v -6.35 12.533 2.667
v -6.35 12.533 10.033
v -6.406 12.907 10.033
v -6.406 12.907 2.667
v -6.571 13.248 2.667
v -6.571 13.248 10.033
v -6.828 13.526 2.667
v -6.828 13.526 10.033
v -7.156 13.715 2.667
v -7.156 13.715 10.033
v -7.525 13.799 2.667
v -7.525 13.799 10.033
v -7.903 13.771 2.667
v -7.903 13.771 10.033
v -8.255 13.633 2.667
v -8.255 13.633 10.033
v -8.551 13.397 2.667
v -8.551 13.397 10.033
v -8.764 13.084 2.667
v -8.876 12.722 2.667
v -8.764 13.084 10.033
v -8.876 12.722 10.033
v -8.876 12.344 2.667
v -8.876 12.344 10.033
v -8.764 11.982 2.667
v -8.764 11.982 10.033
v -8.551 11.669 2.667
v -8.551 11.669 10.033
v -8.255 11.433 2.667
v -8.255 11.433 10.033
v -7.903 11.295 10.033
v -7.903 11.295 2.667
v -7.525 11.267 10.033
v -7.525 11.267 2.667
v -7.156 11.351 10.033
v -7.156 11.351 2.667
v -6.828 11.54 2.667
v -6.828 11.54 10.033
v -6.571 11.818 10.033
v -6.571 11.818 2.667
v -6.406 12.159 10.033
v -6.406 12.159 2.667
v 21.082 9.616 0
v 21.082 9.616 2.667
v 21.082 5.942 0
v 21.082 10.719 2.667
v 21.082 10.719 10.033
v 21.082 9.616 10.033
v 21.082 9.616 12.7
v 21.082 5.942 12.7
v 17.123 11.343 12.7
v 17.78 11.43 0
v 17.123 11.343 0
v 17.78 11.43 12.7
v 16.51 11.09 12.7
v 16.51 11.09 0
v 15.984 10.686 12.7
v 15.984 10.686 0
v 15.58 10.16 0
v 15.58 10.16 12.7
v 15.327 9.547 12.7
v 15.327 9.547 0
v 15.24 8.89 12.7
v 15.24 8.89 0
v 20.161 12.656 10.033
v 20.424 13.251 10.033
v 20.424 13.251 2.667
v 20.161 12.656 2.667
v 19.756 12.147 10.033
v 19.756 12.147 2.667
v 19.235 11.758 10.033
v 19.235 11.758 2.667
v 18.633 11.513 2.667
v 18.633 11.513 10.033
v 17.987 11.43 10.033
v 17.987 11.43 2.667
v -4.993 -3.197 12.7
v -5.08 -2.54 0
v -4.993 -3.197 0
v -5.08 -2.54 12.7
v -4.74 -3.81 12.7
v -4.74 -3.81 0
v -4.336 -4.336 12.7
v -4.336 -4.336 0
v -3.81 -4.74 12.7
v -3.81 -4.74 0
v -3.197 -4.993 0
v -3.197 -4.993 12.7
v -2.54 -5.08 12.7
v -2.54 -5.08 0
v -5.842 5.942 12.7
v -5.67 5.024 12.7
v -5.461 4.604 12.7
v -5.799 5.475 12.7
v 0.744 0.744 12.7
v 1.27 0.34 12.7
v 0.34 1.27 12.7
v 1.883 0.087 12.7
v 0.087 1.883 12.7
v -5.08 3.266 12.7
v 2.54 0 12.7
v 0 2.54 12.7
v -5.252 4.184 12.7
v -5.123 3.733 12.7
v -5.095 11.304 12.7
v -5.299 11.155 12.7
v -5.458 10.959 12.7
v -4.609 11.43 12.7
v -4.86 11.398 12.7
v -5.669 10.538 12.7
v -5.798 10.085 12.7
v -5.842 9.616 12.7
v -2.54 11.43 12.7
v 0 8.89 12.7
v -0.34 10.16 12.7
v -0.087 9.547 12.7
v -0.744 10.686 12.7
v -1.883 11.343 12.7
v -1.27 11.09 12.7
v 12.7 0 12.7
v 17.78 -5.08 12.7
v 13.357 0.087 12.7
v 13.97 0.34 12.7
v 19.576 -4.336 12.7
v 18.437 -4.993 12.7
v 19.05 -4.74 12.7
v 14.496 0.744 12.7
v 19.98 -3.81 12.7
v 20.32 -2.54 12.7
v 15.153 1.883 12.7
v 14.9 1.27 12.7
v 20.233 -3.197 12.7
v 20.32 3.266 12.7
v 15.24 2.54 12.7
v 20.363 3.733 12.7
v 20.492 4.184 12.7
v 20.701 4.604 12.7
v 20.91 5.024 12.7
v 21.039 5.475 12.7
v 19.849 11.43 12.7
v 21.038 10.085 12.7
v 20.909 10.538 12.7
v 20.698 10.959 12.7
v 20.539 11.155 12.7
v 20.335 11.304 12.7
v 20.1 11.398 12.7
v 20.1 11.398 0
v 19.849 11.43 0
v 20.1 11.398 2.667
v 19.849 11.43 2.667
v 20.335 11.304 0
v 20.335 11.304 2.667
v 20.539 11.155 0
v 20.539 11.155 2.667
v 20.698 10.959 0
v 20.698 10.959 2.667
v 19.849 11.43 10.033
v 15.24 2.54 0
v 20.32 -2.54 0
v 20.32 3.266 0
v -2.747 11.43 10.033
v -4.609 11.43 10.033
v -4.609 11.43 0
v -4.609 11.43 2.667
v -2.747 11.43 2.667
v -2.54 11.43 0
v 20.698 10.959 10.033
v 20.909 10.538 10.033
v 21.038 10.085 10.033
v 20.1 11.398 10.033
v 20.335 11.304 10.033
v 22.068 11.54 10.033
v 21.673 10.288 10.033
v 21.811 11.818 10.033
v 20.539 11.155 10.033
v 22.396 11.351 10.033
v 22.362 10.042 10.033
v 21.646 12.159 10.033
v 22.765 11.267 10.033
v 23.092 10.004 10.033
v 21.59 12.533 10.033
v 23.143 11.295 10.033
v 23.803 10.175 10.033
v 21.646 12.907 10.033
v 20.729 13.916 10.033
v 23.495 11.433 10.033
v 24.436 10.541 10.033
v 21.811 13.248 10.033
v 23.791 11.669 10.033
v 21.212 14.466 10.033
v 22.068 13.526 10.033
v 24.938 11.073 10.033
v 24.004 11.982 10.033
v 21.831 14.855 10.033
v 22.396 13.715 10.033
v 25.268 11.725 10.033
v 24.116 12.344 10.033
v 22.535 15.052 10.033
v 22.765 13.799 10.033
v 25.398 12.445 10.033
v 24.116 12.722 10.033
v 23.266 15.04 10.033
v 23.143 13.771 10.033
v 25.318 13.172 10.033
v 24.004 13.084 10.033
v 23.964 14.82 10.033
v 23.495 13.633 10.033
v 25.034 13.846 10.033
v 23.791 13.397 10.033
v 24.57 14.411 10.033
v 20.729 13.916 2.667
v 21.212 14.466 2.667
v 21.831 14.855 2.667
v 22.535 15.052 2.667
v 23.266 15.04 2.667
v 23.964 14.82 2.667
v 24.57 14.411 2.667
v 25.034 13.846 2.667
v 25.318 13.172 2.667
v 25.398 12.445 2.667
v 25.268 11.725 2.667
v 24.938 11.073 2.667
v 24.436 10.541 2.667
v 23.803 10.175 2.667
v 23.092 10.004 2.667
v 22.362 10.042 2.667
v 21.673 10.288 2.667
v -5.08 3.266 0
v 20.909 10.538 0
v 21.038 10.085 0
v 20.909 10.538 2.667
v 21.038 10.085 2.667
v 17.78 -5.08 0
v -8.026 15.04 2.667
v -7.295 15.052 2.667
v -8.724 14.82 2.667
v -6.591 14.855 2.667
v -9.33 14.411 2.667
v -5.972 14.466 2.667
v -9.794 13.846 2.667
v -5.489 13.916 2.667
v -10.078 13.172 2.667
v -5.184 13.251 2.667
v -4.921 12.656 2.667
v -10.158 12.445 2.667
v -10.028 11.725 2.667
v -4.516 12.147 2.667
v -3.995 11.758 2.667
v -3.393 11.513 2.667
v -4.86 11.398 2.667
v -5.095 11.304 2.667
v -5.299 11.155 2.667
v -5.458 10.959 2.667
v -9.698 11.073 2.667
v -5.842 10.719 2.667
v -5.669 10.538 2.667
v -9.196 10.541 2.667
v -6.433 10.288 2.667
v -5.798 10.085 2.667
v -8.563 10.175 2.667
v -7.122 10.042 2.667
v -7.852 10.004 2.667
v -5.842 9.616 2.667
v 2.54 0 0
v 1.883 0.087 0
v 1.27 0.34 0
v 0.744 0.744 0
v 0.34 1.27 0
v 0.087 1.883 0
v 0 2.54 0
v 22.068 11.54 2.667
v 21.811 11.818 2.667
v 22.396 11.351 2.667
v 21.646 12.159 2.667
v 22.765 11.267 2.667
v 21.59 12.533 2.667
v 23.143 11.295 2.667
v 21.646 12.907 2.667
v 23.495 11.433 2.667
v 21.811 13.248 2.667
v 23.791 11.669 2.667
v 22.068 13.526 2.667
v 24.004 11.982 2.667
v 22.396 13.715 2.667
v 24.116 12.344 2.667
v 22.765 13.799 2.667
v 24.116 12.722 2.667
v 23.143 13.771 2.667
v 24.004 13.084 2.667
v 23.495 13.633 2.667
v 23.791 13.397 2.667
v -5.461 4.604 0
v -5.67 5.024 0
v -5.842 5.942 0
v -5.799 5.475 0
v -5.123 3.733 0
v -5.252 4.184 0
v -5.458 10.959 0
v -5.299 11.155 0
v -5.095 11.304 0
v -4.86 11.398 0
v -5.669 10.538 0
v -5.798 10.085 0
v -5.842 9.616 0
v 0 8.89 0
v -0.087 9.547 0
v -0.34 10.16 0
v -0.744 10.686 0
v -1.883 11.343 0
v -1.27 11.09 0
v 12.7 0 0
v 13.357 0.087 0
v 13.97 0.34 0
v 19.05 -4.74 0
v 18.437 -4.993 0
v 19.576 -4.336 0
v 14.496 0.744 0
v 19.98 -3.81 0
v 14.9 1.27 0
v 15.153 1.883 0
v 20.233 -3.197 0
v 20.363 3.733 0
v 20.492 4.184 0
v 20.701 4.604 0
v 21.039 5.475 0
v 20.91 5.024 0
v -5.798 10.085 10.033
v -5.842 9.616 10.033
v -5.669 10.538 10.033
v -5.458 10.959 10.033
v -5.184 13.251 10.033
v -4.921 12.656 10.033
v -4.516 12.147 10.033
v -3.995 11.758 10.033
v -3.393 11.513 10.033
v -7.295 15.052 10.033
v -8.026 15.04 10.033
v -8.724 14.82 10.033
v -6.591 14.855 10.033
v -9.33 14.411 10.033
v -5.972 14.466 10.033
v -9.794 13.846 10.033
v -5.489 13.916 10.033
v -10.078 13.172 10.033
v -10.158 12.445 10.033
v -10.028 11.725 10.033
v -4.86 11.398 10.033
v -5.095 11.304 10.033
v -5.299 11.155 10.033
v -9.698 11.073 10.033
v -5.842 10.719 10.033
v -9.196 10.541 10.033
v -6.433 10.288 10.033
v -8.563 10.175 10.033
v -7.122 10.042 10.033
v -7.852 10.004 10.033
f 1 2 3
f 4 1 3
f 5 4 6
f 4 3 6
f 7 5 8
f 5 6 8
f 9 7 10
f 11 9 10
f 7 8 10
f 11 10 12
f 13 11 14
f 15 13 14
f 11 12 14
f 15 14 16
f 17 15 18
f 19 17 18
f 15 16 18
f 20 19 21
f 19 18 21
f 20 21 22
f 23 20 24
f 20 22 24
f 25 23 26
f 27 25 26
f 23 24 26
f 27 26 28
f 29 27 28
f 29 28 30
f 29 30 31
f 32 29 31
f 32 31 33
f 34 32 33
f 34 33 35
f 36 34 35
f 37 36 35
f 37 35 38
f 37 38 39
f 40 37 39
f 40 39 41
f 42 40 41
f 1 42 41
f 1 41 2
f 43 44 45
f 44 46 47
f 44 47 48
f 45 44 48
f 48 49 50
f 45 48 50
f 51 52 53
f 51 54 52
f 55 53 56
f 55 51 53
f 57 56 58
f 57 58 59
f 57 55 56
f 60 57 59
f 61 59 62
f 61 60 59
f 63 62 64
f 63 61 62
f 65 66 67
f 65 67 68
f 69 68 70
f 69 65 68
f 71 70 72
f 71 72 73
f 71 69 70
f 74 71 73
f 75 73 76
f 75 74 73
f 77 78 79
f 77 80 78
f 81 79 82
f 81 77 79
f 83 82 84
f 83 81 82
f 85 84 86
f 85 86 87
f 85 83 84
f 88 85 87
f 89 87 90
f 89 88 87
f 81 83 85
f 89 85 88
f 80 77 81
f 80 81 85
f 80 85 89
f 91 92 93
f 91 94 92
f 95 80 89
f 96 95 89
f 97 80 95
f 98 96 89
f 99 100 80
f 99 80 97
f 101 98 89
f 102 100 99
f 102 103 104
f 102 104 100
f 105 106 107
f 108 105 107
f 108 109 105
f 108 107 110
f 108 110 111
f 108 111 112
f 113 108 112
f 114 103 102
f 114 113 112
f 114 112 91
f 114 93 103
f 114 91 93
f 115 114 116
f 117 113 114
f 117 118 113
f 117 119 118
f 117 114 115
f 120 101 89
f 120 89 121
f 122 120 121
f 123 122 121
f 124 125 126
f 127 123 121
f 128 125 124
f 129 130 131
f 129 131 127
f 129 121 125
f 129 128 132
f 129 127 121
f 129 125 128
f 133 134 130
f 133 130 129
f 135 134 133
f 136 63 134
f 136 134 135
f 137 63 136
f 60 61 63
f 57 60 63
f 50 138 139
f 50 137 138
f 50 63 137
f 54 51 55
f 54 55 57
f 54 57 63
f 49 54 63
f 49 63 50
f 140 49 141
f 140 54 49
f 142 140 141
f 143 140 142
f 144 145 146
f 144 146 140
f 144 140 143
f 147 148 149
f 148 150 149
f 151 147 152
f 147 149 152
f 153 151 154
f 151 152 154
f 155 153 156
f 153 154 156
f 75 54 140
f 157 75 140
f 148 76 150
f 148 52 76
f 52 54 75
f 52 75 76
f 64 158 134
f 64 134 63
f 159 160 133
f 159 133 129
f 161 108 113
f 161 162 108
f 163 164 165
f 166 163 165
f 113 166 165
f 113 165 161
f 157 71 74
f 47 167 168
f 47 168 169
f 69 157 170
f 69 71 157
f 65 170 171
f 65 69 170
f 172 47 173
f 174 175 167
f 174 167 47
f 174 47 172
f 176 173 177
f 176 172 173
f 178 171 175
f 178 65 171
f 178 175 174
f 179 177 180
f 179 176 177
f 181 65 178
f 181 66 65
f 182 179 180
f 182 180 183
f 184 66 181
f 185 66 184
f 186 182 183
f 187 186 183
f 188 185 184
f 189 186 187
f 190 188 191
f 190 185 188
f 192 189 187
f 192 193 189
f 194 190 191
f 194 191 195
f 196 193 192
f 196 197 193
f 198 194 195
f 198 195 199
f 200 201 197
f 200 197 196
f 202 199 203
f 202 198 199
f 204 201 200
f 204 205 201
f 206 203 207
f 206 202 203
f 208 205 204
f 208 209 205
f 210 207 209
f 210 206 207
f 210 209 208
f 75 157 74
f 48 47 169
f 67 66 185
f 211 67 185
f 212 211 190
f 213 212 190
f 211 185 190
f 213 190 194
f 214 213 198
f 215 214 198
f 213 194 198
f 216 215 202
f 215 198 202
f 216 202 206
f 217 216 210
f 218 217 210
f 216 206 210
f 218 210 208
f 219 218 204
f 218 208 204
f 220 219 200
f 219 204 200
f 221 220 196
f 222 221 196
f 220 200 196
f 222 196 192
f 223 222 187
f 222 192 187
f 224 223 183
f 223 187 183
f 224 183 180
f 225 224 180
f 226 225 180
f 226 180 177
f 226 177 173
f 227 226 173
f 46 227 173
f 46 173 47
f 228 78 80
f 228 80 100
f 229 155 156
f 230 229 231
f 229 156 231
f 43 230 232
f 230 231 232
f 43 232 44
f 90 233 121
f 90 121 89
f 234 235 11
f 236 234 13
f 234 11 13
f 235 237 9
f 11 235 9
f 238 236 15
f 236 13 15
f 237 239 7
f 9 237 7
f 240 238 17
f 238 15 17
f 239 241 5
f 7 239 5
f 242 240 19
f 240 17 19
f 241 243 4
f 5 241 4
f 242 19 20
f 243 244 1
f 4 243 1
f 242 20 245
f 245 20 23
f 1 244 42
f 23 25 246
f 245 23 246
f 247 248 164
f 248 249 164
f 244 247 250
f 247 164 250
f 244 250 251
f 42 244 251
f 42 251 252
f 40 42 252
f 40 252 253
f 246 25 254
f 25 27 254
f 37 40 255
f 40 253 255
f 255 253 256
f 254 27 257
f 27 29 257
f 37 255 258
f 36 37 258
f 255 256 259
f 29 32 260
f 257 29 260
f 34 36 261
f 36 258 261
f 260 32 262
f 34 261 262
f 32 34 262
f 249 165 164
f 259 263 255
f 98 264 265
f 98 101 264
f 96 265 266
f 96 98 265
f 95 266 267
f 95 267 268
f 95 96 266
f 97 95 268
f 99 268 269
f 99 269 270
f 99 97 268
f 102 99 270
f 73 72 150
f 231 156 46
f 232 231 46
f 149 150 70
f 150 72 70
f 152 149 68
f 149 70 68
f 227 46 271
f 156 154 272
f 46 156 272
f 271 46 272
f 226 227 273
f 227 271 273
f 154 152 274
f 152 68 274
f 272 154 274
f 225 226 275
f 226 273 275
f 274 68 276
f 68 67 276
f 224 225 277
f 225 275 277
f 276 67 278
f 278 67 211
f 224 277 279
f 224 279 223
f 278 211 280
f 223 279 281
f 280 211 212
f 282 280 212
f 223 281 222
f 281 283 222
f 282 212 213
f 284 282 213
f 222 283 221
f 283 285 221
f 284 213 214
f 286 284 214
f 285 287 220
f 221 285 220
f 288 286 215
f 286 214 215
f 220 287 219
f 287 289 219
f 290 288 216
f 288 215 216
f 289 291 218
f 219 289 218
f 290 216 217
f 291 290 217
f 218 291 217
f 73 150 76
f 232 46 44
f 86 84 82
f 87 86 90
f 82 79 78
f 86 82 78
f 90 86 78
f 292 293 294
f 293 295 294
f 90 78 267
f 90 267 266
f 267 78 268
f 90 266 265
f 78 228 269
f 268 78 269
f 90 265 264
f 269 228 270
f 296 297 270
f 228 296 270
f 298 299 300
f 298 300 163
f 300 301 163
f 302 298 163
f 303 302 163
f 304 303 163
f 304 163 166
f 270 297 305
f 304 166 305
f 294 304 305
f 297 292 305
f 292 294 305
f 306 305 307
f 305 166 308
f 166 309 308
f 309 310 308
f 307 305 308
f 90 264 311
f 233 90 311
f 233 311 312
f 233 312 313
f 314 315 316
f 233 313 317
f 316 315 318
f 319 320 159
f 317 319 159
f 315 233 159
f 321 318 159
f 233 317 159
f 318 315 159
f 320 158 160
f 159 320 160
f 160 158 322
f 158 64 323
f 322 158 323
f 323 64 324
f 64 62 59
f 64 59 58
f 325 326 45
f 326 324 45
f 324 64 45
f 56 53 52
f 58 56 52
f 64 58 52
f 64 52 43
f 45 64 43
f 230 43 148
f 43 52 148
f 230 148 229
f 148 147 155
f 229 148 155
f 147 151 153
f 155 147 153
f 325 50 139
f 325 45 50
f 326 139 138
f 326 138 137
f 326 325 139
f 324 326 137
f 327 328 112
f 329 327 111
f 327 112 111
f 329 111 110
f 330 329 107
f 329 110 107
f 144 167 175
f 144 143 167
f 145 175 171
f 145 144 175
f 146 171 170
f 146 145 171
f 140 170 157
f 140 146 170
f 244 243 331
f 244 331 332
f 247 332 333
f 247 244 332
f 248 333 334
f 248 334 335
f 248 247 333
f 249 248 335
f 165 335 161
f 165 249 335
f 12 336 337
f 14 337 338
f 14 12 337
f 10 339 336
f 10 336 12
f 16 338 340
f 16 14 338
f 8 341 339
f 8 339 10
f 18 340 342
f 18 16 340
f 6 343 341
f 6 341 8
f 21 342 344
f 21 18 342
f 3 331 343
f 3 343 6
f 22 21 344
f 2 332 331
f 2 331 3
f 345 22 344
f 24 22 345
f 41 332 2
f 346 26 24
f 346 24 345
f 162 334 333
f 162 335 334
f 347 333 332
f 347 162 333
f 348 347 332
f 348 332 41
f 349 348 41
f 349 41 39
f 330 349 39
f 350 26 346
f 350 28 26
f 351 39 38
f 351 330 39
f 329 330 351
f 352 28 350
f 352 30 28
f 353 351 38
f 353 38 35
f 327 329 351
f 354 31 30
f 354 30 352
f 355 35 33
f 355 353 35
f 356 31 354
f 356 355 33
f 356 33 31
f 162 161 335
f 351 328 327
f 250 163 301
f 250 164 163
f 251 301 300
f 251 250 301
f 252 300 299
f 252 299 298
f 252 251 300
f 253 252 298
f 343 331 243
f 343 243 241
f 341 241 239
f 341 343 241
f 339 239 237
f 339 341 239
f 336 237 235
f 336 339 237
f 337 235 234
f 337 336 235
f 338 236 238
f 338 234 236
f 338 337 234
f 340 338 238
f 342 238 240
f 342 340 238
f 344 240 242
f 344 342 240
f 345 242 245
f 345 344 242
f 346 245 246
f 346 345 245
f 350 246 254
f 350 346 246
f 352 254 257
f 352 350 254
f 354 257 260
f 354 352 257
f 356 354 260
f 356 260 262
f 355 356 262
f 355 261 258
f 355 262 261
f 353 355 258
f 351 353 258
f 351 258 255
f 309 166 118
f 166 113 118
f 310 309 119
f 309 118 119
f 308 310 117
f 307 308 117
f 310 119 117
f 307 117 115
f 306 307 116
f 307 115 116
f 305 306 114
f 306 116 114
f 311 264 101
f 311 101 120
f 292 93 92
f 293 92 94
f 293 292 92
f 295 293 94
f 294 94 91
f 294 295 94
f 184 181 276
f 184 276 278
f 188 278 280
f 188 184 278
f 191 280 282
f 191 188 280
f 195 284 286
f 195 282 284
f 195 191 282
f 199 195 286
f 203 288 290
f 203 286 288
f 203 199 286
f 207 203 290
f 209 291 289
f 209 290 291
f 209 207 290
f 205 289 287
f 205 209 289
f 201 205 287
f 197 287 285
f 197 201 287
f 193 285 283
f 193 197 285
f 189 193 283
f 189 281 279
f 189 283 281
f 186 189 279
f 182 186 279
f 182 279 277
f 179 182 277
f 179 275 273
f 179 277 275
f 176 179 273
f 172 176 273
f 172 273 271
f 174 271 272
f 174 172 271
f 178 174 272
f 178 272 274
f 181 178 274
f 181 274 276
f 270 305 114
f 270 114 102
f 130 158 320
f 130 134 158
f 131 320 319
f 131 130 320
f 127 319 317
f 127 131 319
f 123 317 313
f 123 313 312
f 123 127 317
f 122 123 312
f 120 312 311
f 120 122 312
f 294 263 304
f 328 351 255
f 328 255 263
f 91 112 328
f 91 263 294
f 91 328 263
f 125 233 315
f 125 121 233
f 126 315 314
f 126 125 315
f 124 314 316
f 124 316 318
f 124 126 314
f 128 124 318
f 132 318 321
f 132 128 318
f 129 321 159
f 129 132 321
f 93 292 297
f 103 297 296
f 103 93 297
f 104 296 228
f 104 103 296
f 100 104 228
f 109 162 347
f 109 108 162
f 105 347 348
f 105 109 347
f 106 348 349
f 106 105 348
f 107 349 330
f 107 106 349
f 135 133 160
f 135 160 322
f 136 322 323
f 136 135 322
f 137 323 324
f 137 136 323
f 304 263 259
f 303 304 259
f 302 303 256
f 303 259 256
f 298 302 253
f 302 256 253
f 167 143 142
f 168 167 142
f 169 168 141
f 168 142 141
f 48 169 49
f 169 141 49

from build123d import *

# Parameters (mm, degrees)
BOSS_EXTRUDE1_DEPTH = 12.7
SKETCH3_R           = 1.27
BOSS_EXTRUDE2_DEPTH = 12.7
CUT_EXTRUDE6_START  = 13.462
CUT_EXTRUDE6_DEPTH  = 13.462
FILLET2_R           = 2.54
FILLET3_R           = 2.54
FILLET4_R           = 2.54
FILLET5_R           = 2.54
FILLET6_R           = 1


with BuildPart() as part:
    # Sketch1 → Boss-Extrude1 (new body)
    with BuildSketch(Plane.XY):
        Polygon((-5.08, -5.08), (-5.08, 11.43), (0, 11.43), (0, 0), (15.24, 0), (15.24, 11.43), (20.32, 11.43), (20.32, -5.08), align=None)
    extrude(amount=BOSS_EXTRUDE1_DEPTH)

    # Sketch3 → Boss-Extrude2 (add)
    with BuildSketch(Plane.XY.offset(12.7)):
        with BuildLine():
            Line((-5.08, 5.08), (-5.08, 12.532978233))
            ThreePointArc((-5.08, 12.532978233), (-9.961764292, 13.516716003), (-5.842, 10.719055412))
            Line((-5.842, 10.719055412), (-5.842, 5.08))
            Line((-5.842, 5.08), (-5.08, 5.08))
        make_face()
        with Locations((-7.62, 12.532978233)):
            Circle(SKETCH3_R, mode=Mode.SUBTRACT)
    boss_extrude2 = extrude(amount=-BOSS_EXTRUDE2_DEPTH)

    # Sketch9 → Cut-Extrude6 (cut)
    with BuildSketch(Plane.XY.offset(10.033).offset(CUT_EXTRUDE6_START)):
        with BuildLine():
            Line((-5.08, 12.532978233), (-5.08, 11.43))
            Line((-5.08, 11.43), (-5.842, 10.719055412))
            ThreePointArc((-5.842, 10.719055412), (-9.961764292, 13.516716003), (-5.08, 12.532978233))
        make_face()
        with BuildLine():
            Line((21.082, 10.719055412), (20.32, 11.43))
            Line((20.32, 11.43), (20.32, 12.532978233))
            ThreePointArc((20.32, 12.532978233), (25.201764292, 13.516716003), (21.082, 10.719055412))
        make_face()
    cut_extrude6 = extrude(amount=-CUT_EXTRUDE6_DEPTH, mode=Mode.SUBTRACT)

    # Fillet2
    fillet2_edges = [part.edges().sort_by_distance(p)[0] for p in [
        (15.24, 11.43, 6.35),
        (0, 11.43, 6.35),
    ]]
    fillet(fillet2_edges, radius=FILLET2_R)

    # Fillet3
    fillet3_edges = [part.edges().sort_by_distance(p)[0] for p in [
        (0, 0, 6.35),
        (15.24, 0, 6.35),
    ]]
    fillet(fillet3_edges, radius=FILLET3_R)

    # Mirror1: Boss-Extrude2, Cut-Extrude6 across plane
    add(boss_extrude2.mirror(Plane(origin=(7.62, 0, 0), x_dir=(0, 0, 1), z_dir=(1, 0, 0))))
    add(cut_extrude6.mirror(Plane(origin=(7.62, 0, 0), x_dir=(0, 0, 1), z_dir=(1, 0, 0))), mode=Mode.SUBTRACT)

    # Mirror3: Cut-Extrude6 across plane
    add(cut_extrude6.mirror(Plane.XY.offset(6.35)), mode=Mode.SUBTRACT)

    # Fillet4
    # the kernel refuses this fillet: 2.54 mm, written as the material it adds along each edge
    with BuildSketch(Plane(origin=(20.32, 11.43, 10.033), x_dir=(-1, 0, 0), z_dir=(0, 0, -1)), Plane(origin=(-5.08, 11.43, 2.667), x_dir=(1, 0, 0), z_dir=(0, 0, 1))) as fillet4_piece_1:
        with BuildLine():
            CenterArc((2.332511513, 2.54), FILLET4_R, 196.432066058, 73.567933942)
            Line((-0.103744244, 1.821489116), (-0.347369819, 1.749638028))
            ThreePointArc((-0.347369819, 1.749638028), (-0.254, 1.102978233), (-0.254, 0))
            Line((-0.254, 0), (0, -0.254))
            Line((0, -0.254), (2.332511513, -0.254))
            Line((2.332511513, -0.254), (2.332511513, 0))
        make_face()
    extrude(amount=7.366)
    with BuildSketch(Plane(origin=(20.32, 5.08, 12.7), x_dir=(0, -1, 0), z_dir=(0, 0, -1))) as fillet4_piece_2:
        with BuildLine():
            CenterArc((1.813922821, -2.54), FILLET4_R, 90, 45.572995999)
            Line((0, -0.762), (0, 0))
            Line((0, 0), (1.813922821, 0))
        make_face()
    extrude(amount=12.7)
    with BuildSketch(Plane(origin=(-5.08, 5.08, 12.7), x_dir=(-1, 0, 0), z_dir=(0, 0, -1))) as fillet4_piece_3:
        with BuildLine():
            CenterArc((2.54, -1.813922821), FILLET4_R, 134.427004001, 45.572995999)
            Line((0, -1.813922821), (0, 0))
            Line((0, 0), (0.762, 0))
        make_face()
    extrude(amount=12.7)
    # the kernel refuses this fillet: 2.54 mm, written as the material it takes off along each edge
    with BuildSketch(Plane(origin=(-5.842, 10.719055412, 15.457445582), x_dir=(0.7311775057890088, 0.6821872580370908, 0), z_dir=(0, 0, -1)), Plane(origin=(-5.842, 10.719055412, 2.667), x_dir=(0.7311775057890088, 0.6821872580370908, 0), z_dir=(0, 0, -1))) as fillet4_2_piece_1:
        with BuildLine():
            CenterArc((1.104753168, 2.539228509), FILLET4_R, 223.014800445, 45.572995999)
            Line((-0.752437696, 0.806472873), (0, 0))
            Line((0, 0), (1.042154599, 0))
        make_face()
    extrude(amount=5.424445582, mode=Mode.SUBTRACT)
    with BuildSketch(Plane(origin=(21.082, 10.719055412, 2.667), x_dir=(-0.7311775057890088, 0.6821872580370906, 0), z_dir=(0, 0, -1))) as fillet4_2_piece_2:
        with BuildLine():
            CenterArc((1.104753168, -2.539228509), FILLET4_R, 91.412203555, 45.572995999)
            Line((-0.752437696, -0.806472873), (0, 0))
            Line((0, 0), (1.042154599, 0))
        make_face()
    extrude(amount=5.424445582, mode=Mode.SUBTRACT)
    with BuildSketch(Plane(origin=(21.082, 10.719055412, 15.457445582), x_dir=(0, -1, 0), z_dir=(0, 0, -1))) as fillet4_2_piece_3:
        with BuildLine():
            CenterArc((1.102978233, 2.54), FILLET4_R, 224.427004001, 45.572995999)
            Line((-0.710944588, 0.762), (0, 0))
            Line((0, 0), (1.102978233, 0))
        make_face()
    extrude(amount=5.424445582, mode=Mode.SUBTRACT)

    # Fillet5
    fillet5_edges = [part.edges().sort_by_distance(p)[0] for p in [
        (20.32, -5.08, 6.35),
        (-5.08, -5.08, 6.35),
        (-5.842, 5.08, 6.35),
        (21.082, 5.08, 6.35),
    ]]
    fillet(fillet5_edges, radius=FILLET5_R)

    # Fillet6
    fillet6_edges = [part.edges().sort_by_distance(p)[0] for p in [
        (-5.08, 11.43, 1.3335),
        (20.32, 11.43, 11.3665),
        (20.32, 11.43, 1.3335),
        (-5.08, 11.43, 11.3665),
    ]]
    fillet(fillet6_edges, radius=FILLET6_R)


solid = part.part
